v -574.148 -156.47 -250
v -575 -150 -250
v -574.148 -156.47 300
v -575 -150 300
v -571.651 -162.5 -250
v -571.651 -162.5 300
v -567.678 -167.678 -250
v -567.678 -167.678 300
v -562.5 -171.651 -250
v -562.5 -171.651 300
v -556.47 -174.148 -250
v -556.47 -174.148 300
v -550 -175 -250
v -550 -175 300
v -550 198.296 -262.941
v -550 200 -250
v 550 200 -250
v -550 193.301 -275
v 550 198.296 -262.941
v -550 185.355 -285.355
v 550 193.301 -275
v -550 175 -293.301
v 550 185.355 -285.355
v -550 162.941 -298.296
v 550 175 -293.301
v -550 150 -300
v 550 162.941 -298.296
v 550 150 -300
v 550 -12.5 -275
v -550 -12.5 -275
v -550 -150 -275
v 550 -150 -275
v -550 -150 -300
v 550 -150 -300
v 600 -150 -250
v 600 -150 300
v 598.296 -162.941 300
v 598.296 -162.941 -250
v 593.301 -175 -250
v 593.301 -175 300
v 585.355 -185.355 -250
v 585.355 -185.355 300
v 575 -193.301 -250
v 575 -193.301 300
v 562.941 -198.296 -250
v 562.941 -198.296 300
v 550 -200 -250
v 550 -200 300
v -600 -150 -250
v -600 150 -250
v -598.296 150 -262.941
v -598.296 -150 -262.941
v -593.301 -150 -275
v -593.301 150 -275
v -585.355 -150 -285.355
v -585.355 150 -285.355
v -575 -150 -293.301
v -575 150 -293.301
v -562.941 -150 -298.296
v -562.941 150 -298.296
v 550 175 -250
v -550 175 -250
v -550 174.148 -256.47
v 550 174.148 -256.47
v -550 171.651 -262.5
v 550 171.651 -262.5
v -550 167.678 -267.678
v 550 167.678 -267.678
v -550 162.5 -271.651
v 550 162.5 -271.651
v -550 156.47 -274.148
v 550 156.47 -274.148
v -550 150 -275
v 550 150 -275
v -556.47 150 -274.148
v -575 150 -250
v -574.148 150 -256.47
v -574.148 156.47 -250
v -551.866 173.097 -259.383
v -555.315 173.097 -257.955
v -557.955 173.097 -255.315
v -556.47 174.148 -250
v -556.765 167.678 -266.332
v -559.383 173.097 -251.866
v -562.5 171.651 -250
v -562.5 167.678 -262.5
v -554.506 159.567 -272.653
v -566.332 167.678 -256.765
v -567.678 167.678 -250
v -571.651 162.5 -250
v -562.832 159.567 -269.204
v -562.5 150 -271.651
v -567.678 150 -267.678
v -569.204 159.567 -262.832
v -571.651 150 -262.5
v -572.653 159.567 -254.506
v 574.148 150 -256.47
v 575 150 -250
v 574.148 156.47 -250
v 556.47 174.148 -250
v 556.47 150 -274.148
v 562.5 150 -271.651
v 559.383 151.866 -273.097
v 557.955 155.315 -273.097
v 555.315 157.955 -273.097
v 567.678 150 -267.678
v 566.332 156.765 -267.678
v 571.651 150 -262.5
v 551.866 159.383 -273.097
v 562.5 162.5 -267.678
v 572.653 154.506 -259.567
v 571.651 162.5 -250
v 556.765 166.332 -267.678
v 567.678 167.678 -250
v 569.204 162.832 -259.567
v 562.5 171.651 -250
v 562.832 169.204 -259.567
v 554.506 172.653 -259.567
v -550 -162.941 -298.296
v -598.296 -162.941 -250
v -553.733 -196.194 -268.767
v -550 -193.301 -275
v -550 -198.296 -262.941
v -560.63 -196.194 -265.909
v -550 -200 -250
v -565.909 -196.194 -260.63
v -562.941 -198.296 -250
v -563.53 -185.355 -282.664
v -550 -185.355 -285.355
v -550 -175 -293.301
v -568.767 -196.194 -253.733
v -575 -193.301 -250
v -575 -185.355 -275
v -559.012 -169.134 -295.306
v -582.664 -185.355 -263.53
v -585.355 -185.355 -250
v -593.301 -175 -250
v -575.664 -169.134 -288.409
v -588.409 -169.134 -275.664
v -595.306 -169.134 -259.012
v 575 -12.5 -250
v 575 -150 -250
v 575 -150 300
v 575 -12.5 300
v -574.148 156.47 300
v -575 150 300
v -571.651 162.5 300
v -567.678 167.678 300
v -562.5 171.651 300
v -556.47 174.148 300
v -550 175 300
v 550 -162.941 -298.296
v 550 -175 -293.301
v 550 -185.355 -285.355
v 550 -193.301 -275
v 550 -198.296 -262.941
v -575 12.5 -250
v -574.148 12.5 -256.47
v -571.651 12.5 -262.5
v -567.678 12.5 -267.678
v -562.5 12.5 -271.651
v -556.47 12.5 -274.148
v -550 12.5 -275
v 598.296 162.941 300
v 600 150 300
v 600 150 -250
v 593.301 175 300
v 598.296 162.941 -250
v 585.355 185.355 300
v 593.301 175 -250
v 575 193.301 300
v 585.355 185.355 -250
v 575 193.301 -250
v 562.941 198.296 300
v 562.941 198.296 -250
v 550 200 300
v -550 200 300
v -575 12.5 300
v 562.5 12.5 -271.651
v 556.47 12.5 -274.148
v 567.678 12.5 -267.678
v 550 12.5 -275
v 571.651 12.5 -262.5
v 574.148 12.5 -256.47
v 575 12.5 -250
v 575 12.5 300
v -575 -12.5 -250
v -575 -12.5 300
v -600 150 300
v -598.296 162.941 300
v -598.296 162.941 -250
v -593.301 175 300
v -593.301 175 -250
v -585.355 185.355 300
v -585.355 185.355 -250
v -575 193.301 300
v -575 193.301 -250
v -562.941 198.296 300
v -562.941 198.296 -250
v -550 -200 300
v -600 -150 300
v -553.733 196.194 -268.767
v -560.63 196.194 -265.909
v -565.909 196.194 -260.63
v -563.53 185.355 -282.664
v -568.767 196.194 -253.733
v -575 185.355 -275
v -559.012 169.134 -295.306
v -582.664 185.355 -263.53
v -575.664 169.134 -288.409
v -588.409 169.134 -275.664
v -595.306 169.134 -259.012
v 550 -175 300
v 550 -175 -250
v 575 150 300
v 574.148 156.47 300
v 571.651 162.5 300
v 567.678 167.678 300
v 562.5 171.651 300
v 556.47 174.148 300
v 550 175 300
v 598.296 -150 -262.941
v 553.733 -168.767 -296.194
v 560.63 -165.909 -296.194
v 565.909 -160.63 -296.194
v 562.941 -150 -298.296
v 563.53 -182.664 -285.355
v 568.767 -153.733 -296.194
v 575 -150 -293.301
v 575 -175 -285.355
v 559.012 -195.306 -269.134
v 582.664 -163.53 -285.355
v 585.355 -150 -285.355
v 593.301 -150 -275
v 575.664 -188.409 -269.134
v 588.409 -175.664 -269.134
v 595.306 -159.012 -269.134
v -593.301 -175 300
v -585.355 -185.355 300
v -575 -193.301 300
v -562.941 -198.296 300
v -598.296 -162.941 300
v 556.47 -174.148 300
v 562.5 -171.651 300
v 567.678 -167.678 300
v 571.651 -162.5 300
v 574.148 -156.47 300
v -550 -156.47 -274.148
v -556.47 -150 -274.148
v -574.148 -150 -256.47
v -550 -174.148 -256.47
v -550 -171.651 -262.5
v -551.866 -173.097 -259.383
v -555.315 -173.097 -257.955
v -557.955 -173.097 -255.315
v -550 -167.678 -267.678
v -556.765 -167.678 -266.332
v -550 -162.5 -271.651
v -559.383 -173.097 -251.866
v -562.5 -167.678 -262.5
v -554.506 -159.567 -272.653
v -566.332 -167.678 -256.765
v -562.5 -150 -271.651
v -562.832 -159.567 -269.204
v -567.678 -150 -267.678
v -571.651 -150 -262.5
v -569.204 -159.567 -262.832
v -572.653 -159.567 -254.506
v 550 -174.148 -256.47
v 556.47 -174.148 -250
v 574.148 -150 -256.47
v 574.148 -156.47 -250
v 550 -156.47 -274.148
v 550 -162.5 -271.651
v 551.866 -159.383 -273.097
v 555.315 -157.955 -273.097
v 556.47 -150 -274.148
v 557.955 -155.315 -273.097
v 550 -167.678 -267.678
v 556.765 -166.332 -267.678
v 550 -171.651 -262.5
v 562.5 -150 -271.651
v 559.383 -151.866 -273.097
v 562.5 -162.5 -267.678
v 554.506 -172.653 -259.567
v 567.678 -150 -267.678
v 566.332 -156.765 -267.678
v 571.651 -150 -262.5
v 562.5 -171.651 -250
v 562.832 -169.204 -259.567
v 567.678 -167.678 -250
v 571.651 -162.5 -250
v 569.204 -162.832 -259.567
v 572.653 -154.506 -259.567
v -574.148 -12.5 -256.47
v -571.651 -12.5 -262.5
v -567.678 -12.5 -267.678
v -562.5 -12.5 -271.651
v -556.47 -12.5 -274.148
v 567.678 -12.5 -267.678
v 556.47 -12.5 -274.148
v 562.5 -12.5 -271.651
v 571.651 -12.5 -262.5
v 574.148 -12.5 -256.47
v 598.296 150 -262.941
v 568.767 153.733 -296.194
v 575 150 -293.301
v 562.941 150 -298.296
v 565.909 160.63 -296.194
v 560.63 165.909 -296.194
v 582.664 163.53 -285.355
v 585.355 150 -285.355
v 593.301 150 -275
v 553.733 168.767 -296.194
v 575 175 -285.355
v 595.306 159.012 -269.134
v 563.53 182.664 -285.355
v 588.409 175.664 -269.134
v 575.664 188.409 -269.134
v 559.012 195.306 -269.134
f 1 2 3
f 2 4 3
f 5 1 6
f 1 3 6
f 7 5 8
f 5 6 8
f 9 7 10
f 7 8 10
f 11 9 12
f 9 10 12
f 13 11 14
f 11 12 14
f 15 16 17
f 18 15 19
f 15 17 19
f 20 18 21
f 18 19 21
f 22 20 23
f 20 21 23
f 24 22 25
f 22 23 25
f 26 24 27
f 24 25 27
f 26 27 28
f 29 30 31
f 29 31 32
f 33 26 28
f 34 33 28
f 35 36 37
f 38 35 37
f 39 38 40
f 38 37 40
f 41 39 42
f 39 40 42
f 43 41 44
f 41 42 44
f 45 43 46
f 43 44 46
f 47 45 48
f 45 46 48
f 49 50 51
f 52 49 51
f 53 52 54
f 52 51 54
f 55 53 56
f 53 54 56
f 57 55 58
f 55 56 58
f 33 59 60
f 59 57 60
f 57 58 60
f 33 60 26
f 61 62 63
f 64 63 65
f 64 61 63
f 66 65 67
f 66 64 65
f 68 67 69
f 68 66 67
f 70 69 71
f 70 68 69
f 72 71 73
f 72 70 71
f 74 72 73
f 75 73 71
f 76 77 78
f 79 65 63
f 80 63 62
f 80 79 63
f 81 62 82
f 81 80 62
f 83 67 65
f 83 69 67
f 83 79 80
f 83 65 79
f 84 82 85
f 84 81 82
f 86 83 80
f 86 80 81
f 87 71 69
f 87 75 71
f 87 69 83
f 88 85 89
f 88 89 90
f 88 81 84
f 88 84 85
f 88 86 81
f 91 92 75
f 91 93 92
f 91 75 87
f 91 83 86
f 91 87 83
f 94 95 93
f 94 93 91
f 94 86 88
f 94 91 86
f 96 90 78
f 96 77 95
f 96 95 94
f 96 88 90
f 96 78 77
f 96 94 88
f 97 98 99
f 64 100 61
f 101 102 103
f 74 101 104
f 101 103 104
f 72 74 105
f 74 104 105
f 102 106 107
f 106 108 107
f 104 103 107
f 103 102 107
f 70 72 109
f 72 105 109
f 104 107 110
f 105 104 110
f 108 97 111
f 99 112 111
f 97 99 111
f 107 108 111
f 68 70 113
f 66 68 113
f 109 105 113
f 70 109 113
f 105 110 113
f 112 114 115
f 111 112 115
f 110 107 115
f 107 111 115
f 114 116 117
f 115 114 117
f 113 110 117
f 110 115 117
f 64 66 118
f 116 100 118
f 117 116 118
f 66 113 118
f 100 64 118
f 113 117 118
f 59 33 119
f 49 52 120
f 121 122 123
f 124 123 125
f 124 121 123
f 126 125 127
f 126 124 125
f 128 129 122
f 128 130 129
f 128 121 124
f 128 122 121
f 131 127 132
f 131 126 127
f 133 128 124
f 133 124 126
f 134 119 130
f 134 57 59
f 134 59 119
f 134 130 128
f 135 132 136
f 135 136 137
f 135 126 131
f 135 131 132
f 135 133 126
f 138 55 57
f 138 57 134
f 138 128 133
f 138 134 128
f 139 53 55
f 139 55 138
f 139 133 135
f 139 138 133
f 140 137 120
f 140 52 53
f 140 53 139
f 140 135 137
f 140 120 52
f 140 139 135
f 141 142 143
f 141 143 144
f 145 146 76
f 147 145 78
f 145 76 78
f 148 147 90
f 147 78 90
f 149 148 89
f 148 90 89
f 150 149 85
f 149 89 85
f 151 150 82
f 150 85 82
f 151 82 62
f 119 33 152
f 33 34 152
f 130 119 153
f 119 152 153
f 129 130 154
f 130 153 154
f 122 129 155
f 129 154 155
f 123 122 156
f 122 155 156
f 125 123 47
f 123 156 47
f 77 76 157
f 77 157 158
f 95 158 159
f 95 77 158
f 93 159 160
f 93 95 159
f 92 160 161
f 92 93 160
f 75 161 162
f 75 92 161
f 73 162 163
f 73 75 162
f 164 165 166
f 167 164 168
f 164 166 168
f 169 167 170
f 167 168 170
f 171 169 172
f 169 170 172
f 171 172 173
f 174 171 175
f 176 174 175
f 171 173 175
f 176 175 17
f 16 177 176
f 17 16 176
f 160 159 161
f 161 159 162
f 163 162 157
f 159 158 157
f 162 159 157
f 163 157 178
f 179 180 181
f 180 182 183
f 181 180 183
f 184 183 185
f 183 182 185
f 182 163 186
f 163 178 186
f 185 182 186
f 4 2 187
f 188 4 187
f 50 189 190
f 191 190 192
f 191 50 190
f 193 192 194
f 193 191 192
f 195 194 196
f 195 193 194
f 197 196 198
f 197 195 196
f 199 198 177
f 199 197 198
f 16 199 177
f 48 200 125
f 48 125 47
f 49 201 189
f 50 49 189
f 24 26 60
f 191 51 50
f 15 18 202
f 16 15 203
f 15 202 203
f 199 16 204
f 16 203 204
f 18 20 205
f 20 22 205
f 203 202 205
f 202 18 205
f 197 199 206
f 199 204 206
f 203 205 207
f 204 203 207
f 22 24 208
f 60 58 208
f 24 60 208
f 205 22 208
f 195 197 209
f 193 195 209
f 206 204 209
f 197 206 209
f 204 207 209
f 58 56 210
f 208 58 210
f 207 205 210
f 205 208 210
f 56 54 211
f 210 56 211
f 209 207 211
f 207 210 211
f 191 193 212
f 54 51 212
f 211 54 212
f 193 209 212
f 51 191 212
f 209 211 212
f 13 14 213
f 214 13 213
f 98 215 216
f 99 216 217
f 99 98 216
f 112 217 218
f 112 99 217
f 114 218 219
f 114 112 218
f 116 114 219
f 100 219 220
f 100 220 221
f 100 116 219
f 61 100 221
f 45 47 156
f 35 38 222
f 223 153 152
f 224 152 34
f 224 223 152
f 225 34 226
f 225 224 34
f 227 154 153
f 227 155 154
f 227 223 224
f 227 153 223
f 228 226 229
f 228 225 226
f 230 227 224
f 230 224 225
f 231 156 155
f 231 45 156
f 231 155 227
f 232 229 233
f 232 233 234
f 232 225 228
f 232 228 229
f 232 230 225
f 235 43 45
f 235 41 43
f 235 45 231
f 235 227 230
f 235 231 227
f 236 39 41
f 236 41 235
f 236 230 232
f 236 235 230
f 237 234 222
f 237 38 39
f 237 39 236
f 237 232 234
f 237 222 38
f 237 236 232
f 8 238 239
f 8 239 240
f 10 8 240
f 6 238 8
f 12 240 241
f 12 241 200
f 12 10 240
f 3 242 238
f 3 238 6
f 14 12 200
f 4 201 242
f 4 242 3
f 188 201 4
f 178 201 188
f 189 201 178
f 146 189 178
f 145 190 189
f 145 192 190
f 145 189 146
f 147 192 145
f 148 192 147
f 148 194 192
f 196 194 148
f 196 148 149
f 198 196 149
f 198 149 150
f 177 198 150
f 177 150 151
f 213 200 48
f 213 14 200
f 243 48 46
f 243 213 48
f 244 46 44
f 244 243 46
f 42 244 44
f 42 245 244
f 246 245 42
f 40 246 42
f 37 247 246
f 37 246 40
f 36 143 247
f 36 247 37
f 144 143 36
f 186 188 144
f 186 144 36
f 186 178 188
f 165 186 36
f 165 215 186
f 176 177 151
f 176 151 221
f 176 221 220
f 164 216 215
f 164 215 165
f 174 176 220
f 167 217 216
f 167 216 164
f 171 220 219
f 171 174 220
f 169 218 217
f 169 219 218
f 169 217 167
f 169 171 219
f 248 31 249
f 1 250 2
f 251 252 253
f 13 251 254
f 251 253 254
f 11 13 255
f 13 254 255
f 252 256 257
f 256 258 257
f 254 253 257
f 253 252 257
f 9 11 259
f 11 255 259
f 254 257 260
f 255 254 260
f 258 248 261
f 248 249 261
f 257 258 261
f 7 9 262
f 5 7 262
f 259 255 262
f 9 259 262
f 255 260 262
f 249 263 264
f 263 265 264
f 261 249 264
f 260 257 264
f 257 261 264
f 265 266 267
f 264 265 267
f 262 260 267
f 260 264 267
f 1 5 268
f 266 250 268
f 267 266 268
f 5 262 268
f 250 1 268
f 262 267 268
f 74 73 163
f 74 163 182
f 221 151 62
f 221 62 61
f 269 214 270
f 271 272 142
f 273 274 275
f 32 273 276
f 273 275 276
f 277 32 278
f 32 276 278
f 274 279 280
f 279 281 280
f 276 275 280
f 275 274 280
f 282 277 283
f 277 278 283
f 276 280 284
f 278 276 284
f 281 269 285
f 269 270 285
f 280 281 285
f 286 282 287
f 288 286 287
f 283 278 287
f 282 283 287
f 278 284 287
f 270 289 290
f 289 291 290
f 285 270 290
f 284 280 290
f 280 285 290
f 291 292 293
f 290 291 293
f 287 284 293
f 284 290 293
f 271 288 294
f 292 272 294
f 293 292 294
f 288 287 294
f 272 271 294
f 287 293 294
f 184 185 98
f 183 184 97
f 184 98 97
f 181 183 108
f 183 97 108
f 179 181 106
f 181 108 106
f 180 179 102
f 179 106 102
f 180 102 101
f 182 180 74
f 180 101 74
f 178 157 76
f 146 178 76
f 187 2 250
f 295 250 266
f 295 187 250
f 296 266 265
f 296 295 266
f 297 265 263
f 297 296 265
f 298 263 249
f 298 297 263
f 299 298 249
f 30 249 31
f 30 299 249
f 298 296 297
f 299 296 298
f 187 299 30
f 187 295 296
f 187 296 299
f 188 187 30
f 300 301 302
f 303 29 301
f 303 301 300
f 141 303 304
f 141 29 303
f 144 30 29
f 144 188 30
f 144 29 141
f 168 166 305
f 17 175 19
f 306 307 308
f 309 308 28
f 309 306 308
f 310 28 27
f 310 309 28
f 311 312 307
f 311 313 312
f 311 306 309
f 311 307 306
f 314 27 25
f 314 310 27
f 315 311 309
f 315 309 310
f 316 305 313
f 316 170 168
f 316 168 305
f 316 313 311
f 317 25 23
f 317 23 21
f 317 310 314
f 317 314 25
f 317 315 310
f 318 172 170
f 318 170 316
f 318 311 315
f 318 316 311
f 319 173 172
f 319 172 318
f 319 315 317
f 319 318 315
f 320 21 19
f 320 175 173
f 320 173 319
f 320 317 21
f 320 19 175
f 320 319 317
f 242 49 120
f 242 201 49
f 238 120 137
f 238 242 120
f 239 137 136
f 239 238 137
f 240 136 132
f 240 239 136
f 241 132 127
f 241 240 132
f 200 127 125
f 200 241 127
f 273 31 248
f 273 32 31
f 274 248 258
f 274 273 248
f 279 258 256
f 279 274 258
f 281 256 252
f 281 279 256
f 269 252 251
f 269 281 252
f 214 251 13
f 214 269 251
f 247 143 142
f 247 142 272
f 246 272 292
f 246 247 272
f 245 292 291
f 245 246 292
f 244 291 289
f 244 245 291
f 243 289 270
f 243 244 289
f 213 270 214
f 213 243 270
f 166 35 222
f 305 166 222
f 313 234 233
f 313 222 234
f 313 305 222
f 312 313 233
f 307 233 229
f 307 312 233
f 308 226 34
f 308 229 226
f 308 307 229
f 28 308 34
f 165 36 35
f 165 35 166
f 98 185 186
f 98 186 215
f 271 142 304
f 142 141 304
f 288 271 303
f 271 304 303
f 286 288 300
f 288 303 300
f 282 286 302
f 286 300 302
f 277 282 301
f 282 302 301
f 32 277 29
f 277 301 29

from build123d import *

# Parameters (mm, degrees)
SKETCH_W     = 1200
SKETCH_H     = 400
PAD_DEPTH    = 300
FILLET_R     = 50
THICKNESS_T  = -25
SKETCH001_W  = 1150
SKETCH001_H  = 25
PAD001_DEPTH = 575


with BuildPart() as part:
    # Sketch → Pad (new body, symmetric)
    with BuildSketch(Plane.XY):
        Rectangle(SKETCH_W, SKETCH_H)
    extrude(amount=PAD_DEPTH, both=True)

    # Fillet
    fillet_edges = [part.edges().sort_by_distance(p)[0] for p in [
        (600, 200, 0),
        (600, -200, 0),
        (-600, 0, -300),
        (0, -200, -300),
        (600, 0, -300),
        (0, 200, -300),
        (-600, -200, 0),
        (-600, 200, 0),
    ]]
    fillet(fillet_edges, radius=FILLET_R)

    # Thickness
    thickness_openings = [part.faces().sort_by_distance(p)[0] for p in [
        (0, 0, 300),
    ]]
    offset(amount=THICKNESS_T, openings=thickness_openings)

    # Sketch001 (on Face18 of Thickness) → Pad001 (join)
    with BuildSketch(Plane.XY.offset(300)):
        Rectangle(SKETCH001_W, SKETCH001_H)
    extrude(amount=-PAD001_DEPTH)


solid = part.part
